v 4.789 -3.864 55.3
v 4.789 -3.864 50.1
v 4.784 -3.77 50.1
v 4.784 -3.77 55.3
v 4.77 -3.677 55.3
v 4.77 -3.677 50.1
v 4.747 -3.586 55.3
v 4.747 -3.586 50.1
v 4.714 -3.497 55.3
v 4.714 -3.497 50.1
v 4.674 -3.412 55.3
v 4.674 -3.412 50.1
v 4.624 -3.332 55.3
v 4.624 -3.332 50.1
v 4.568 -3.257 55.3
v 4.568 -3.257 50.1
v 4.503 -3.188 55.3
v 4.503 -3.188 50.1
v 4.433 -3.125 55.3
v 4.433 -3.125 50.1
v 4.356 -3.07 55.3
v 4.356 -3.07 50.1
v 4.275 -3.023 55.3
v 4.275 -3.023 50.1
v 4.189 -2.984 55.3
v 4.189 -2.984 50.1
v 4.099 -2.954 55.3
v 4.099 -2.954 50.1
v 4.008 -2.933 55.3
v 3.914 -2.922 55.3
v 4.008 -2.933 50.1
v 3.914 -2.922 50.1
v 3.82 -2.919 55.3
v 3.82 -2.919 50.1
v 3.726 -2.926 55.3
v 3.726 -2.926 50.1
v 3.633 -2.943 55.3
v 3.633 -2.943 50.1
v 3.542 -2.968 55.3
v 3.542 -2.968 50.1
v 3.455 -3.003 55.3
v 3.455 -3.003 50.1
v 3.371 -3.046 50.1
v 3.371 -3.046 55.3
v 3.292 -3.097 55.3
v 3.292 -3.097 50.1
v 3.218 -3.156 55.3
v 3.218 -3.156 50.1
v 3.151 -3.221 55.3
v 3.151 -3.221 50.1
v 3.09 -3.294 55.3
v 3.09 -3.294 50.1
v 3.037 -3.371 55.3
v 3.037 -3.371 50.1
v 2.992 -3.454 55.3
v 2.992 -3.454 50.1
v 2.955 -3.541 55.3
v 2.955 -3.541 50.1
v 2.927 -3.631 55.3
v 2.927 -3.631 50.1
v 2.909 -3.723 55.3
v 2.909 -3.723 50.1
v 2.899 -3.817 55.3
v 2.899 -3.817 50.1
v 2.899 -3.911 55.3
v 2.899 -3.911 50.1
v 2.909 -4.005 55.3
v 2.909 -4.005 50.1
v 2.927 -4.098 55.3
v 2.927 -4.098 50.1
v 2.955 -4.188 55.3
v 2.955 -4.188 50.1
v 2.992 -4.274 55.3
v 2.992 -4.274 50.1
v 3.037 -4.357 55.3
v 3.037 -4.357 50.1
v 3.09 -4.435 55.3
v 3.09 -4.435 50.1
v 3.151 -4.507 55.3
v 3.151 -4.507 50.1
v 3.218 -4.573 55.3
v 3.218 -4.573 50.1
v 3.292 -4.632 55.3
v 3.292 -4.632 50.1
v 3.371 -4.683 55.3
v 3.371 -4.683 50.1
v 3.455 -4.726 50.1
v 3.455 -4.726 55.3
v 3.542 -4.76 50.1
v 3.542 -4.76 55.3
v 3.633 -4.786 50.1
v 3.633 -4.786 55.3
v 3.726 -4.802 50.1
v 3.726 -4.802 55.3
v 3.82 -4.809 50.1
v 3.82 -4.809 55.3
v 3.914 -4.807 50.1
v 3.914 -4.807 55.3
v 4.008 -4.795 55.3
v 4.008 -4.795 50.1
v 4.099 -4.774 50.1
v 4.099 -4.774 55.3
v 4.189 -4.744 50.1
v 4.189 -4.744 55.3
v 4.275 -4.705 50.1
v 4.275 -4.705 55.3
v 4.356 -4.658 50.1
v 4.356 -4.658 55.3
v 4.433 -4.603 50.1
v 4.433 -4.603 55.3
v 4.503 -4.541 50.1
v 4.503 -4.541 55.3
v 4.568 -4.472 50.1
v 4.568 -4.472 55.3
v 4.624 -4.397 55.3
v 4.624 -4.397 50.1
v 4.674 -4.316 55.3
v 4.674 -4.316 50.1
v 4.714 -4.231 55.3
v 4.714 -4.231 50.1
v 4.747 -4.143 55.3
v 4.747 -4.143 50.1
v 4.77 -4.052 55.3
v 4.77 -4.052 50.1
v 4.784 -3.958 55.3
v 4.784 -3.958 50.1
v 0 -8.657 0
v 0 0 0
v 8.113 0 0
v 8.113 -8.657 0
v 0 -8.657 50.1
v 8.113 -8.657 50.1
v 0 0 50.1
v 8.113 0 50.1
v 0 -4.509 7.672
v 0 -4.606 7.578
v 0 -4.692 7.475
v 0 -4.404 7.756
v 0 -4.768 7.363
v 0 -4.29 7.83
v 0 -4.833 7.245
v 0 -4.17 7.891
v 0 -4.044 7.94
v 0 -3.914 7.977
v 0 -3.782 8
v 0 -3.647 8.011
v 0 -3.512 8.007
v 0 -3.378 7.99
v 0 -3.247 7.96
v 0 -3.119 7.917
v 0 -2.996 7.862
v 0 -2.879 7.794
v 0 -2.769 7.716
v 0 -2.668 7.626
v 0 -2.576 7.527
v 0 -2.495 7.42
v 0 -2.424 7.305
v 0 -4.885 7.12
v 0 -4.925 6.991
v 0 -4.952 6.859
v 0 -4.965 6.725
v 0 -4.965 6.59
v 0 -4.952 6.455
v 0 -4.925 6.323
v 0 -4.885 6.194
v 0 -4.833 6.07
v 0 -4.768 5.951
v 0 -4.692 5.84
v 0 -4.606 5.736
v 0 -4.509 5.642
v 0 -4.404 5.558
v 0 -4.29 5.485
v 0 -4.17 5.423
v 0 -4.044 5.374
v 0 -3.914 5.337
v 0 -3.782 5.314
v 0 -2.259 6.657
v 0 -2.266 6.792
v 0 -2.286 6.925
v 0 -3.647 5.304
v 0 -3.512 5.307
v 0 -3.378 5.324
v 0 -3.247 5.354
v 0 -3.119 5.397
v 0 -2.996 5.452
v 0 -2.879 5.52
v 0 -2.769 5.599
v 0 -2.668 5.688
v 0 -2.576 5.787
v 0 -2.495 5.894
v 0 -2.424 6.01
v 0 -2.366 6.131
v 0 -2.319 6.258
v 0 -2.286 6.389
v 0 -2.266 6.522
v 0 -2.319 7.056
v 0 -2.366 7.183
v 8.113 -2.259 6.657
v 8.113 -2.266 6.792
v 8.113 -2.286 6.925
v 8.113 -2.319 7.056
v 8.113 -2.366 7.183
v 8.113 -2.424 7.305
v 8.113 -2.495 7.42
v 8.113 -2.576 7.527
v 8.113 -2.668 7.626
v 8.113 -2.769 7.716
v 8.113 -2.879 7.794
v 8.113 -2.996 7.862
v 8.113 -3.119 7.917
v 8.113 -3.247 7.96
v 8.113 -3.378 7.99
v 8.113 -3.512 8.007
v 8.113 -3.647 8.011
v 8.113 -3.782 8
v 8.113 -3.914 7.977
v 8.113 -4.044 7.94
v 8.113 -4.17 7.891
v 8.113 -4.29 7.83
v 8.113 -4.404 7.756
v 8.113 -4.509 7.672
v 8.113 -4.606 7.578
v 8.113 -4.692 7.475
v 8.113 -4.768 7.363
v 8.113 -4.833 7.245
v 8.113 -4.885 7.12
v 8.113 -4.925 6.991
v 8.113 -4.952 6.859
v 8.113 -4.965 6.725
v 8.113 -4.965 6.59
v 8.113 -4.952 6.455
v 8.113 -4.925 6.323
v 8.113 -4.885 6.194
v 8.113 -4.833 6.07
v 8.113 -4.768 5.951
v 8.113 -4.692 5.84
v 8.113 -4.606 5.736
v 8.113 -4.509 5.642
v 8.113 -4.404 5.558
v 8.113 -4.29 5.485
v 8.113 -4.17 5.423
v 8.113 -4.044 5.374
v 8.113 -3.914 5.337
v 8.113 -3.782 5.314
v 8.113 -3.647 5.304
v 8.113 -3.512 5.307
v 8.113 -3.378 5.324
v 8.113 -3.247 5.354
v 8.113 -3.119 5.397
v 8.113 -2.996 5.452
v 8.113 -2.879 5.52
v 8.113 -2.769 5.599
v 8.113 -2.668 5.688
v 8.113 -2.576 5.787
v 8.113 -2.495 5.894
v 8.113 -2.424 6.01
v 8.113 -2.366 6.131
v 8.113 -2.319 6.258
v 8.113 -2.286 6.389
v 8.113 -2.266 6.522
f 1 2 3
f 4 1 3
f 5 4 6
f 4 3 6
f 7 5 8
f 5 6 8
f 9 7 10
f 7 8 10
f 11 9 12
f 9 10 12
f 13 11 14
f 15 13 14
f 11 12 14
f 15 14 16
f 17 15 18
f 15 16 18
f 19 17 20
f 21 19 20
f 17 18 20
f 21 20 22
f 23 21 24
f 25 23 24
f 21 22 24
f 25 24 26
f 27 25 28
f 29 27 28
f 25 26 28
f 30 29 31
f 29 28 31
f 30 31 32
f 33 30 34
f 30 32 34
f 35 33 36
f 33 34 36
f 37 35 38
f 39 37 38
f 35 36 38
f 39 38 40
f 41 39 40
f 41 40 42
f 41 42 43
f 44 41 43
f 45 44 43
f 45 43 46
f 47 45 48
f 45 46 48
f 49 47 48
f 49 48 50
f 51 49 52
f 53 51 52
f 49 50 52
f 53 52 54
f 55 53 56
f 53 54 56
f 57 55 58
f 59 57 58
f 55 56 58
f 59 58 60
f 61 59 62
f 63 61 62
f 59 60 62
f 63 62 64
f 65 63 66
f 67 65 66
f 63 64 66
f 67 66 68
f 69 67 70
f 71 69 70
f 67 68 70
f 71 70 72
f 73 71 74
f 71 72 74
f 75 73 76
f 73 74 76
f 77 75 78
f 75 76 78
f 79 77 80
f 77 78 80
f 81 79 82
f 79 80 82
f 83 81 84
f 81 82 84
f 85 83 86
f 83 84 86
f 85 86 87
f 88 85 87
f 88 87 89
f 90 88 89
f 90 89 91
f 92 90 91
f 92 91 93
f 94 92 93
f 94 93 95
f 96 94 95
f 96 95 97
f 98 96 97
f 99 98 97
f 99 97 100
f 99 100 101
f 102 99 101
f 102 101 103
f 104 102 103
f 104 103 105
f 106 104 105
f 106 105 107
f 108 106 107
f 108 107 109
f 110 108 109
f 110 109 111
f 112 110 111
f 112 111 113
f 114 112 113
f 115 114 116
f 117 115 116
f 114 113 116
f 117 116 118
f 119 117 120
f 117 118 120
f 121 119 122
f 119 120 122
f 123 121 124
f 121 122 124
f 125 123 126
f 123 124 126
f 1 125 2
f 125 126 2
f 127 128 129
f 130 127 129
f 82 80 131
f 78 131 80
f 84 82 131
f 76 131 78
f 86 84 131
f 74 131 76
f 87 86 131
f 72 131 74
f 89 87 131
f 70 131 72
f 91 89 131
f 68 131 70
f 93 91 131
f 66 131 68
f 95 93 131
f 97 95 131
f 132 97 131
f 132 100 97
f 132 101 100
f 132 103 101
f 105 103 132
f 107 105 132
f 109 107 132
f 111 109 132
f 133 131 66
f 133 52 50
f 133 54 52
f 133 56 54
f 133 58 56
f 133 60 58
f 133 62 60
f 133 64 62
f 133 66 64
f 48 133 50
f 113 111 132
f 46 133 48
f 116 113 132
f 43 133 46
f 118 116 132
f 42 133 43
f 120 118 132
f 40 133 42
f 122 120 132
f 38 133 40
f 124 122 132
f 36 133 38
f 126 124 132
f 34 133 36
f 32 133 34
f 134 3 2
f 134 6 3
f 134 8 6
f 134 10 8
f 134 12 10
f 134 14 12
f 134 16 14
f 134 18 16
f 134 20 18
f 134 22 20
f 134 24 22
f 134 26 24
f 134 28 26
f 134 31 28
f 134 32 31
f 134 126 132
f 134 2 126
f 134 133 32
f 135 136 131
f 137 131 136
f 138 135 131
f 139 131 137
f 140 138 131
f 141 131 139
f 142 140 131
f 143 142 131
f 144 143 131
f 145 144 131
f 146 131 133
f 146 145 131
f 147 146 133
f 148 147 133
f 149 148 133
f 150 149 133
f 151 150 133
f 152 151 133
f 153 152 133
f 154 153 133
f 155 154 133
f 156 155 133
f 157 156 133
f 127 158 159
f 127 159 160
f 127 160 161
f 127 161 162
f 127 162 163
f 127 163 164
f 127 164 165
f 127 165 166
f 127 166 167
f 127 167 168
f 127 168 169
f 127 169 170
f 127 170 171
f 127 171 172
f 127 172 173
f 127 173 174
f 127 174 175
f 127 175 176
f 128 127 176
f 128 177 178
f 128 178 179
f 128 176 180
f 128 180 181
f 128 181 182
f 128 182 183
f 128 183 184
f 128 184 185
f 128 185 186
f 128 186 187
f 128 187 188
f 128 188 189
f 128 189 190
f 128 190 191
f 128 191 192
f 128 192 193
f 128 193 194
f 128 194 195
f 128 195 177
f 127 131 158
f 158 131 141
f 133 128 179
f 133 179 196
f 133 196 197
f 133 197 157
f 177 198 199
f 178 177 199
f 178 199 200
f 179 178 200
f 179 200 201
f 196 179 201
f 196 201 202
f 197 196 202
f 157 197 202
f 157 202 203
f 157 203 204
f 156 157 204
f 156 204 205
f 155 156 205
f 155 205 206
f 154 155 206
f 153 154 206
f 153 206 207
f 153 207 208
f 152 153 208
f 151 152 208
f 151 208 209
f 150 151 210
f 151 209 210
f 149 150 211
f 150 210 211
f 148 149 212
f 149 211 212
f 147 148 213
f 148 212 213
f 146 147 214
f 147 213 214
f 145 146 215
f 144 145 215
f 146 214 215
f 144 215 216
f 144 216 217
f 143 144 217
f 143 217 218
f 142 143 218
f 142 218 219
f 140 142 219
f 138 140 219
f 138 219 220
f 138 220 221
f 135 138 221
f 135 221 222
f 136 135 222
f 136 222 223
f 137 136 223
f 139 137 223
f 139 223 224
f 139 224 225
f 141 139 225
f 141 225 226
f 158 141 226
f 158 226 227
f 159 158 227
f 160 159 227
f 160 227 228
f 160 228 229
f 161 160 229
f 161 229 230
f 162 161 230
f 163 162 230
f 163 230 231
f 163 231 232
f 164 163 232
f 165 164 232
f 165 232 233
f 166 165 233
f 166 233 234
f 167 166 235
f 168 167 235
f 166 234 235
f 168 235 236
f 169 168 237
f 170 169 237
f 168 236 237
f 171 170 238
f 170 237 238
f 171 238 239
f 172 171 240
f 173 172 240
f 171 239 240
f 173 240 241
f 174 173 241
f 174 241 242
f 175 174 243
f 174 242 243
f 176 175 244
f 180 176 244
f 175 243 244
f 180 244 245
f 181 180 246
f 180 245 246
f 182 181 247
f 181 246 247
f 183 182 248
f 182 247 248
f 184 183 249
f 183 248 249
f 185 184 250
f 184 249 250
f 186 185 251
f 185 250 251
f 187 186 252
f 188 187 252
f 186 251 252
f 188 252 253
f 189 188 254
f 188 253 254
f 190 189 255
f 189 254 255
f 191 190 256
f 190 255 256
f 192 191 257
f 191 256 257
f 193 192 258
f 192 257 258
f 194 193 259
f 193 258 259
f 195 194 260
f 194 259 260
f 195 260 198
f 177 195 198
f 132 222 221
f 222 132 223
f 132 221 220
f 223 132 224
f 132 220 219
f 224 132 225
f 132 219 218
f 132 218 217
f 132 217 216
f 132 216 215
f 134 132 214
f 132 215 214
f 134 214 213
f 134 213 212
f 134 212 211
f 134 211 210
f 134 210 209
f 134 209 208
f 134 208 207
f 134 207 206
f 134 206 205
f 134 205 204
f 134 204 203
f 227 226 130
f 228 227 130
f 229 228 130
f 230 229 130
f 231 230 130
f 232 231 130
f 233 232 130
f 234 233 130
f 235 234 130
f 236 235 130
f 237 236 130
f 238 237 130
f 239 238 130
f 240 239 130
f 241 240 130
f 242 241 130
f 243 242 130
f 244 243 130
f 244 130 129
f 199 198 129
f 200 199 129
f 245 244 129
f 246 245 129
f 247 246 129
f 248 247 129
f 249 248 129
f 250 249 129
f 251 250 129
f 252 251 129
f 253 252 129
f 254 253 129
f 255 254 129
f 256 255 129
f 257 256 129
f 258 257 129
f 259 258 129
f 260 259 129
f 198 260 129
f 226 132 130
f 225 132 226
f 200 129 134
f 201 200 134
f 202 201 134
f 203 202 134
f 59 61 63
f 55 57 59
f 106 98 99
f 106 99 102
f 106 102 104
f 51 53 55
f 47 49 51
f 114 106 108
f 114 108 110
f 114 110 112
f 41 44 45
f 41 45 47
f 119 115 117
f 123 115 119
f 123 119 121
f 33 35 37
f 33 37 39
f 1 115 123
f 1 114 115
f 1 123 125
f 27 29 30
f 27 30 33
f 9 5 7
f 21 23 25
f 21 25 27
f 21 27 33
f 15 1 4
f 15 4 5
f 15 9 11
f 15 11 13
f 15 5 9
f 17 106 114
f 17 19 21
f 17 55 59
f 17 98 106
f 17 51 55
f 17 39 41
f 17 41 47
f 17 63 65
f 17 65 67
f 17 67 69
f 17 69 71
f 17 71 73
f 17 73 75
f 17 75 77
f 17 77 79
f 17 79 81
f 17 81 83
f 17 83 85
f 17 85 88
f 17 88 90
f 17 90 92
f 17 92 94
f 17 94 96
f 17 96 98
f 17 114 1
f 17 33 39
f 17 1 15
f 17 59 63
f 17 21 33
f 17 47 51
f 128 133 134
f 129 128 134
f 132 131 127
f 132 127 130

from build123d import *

# Parameters (mm, degrees)
F0_W     = 8.112996
F0_H     = 8.656824
F1_DEPTH = 50.1
F2_R     = 1.353874
F3_DEPTH = 25
F4_R     = 0.945263
F5_DEPTH = 5.2


with BuildPart() as f1:
    # F0 (on Top) → F1 (new body)
    with BuildSketch(Plane.XY):
        with Locations((4.056498, -4.328412)):
            Rectangle(F0_W, F0_H)
    extrude(amount=F1_DEPTH)

    # F2 (on face) → F3 (cut)
    with BuildSketch(Plane.YZ.offset(8.112996)):
        with Locations((-3.613207, 6.657105)):
            Circle(F2_R)
    extrude(amount=-F3_DEPTH, mode=Mode.SUBTRACT)

    # F4 (on face) → F5 (join)
    with BuildSketch(Plane.XY.offset(50.1)):
        with Locations((3.843431, -3.864297)):
            Circle(F4_R)
    extrude(amount=F5_DEPTH)


solid = f1.part
